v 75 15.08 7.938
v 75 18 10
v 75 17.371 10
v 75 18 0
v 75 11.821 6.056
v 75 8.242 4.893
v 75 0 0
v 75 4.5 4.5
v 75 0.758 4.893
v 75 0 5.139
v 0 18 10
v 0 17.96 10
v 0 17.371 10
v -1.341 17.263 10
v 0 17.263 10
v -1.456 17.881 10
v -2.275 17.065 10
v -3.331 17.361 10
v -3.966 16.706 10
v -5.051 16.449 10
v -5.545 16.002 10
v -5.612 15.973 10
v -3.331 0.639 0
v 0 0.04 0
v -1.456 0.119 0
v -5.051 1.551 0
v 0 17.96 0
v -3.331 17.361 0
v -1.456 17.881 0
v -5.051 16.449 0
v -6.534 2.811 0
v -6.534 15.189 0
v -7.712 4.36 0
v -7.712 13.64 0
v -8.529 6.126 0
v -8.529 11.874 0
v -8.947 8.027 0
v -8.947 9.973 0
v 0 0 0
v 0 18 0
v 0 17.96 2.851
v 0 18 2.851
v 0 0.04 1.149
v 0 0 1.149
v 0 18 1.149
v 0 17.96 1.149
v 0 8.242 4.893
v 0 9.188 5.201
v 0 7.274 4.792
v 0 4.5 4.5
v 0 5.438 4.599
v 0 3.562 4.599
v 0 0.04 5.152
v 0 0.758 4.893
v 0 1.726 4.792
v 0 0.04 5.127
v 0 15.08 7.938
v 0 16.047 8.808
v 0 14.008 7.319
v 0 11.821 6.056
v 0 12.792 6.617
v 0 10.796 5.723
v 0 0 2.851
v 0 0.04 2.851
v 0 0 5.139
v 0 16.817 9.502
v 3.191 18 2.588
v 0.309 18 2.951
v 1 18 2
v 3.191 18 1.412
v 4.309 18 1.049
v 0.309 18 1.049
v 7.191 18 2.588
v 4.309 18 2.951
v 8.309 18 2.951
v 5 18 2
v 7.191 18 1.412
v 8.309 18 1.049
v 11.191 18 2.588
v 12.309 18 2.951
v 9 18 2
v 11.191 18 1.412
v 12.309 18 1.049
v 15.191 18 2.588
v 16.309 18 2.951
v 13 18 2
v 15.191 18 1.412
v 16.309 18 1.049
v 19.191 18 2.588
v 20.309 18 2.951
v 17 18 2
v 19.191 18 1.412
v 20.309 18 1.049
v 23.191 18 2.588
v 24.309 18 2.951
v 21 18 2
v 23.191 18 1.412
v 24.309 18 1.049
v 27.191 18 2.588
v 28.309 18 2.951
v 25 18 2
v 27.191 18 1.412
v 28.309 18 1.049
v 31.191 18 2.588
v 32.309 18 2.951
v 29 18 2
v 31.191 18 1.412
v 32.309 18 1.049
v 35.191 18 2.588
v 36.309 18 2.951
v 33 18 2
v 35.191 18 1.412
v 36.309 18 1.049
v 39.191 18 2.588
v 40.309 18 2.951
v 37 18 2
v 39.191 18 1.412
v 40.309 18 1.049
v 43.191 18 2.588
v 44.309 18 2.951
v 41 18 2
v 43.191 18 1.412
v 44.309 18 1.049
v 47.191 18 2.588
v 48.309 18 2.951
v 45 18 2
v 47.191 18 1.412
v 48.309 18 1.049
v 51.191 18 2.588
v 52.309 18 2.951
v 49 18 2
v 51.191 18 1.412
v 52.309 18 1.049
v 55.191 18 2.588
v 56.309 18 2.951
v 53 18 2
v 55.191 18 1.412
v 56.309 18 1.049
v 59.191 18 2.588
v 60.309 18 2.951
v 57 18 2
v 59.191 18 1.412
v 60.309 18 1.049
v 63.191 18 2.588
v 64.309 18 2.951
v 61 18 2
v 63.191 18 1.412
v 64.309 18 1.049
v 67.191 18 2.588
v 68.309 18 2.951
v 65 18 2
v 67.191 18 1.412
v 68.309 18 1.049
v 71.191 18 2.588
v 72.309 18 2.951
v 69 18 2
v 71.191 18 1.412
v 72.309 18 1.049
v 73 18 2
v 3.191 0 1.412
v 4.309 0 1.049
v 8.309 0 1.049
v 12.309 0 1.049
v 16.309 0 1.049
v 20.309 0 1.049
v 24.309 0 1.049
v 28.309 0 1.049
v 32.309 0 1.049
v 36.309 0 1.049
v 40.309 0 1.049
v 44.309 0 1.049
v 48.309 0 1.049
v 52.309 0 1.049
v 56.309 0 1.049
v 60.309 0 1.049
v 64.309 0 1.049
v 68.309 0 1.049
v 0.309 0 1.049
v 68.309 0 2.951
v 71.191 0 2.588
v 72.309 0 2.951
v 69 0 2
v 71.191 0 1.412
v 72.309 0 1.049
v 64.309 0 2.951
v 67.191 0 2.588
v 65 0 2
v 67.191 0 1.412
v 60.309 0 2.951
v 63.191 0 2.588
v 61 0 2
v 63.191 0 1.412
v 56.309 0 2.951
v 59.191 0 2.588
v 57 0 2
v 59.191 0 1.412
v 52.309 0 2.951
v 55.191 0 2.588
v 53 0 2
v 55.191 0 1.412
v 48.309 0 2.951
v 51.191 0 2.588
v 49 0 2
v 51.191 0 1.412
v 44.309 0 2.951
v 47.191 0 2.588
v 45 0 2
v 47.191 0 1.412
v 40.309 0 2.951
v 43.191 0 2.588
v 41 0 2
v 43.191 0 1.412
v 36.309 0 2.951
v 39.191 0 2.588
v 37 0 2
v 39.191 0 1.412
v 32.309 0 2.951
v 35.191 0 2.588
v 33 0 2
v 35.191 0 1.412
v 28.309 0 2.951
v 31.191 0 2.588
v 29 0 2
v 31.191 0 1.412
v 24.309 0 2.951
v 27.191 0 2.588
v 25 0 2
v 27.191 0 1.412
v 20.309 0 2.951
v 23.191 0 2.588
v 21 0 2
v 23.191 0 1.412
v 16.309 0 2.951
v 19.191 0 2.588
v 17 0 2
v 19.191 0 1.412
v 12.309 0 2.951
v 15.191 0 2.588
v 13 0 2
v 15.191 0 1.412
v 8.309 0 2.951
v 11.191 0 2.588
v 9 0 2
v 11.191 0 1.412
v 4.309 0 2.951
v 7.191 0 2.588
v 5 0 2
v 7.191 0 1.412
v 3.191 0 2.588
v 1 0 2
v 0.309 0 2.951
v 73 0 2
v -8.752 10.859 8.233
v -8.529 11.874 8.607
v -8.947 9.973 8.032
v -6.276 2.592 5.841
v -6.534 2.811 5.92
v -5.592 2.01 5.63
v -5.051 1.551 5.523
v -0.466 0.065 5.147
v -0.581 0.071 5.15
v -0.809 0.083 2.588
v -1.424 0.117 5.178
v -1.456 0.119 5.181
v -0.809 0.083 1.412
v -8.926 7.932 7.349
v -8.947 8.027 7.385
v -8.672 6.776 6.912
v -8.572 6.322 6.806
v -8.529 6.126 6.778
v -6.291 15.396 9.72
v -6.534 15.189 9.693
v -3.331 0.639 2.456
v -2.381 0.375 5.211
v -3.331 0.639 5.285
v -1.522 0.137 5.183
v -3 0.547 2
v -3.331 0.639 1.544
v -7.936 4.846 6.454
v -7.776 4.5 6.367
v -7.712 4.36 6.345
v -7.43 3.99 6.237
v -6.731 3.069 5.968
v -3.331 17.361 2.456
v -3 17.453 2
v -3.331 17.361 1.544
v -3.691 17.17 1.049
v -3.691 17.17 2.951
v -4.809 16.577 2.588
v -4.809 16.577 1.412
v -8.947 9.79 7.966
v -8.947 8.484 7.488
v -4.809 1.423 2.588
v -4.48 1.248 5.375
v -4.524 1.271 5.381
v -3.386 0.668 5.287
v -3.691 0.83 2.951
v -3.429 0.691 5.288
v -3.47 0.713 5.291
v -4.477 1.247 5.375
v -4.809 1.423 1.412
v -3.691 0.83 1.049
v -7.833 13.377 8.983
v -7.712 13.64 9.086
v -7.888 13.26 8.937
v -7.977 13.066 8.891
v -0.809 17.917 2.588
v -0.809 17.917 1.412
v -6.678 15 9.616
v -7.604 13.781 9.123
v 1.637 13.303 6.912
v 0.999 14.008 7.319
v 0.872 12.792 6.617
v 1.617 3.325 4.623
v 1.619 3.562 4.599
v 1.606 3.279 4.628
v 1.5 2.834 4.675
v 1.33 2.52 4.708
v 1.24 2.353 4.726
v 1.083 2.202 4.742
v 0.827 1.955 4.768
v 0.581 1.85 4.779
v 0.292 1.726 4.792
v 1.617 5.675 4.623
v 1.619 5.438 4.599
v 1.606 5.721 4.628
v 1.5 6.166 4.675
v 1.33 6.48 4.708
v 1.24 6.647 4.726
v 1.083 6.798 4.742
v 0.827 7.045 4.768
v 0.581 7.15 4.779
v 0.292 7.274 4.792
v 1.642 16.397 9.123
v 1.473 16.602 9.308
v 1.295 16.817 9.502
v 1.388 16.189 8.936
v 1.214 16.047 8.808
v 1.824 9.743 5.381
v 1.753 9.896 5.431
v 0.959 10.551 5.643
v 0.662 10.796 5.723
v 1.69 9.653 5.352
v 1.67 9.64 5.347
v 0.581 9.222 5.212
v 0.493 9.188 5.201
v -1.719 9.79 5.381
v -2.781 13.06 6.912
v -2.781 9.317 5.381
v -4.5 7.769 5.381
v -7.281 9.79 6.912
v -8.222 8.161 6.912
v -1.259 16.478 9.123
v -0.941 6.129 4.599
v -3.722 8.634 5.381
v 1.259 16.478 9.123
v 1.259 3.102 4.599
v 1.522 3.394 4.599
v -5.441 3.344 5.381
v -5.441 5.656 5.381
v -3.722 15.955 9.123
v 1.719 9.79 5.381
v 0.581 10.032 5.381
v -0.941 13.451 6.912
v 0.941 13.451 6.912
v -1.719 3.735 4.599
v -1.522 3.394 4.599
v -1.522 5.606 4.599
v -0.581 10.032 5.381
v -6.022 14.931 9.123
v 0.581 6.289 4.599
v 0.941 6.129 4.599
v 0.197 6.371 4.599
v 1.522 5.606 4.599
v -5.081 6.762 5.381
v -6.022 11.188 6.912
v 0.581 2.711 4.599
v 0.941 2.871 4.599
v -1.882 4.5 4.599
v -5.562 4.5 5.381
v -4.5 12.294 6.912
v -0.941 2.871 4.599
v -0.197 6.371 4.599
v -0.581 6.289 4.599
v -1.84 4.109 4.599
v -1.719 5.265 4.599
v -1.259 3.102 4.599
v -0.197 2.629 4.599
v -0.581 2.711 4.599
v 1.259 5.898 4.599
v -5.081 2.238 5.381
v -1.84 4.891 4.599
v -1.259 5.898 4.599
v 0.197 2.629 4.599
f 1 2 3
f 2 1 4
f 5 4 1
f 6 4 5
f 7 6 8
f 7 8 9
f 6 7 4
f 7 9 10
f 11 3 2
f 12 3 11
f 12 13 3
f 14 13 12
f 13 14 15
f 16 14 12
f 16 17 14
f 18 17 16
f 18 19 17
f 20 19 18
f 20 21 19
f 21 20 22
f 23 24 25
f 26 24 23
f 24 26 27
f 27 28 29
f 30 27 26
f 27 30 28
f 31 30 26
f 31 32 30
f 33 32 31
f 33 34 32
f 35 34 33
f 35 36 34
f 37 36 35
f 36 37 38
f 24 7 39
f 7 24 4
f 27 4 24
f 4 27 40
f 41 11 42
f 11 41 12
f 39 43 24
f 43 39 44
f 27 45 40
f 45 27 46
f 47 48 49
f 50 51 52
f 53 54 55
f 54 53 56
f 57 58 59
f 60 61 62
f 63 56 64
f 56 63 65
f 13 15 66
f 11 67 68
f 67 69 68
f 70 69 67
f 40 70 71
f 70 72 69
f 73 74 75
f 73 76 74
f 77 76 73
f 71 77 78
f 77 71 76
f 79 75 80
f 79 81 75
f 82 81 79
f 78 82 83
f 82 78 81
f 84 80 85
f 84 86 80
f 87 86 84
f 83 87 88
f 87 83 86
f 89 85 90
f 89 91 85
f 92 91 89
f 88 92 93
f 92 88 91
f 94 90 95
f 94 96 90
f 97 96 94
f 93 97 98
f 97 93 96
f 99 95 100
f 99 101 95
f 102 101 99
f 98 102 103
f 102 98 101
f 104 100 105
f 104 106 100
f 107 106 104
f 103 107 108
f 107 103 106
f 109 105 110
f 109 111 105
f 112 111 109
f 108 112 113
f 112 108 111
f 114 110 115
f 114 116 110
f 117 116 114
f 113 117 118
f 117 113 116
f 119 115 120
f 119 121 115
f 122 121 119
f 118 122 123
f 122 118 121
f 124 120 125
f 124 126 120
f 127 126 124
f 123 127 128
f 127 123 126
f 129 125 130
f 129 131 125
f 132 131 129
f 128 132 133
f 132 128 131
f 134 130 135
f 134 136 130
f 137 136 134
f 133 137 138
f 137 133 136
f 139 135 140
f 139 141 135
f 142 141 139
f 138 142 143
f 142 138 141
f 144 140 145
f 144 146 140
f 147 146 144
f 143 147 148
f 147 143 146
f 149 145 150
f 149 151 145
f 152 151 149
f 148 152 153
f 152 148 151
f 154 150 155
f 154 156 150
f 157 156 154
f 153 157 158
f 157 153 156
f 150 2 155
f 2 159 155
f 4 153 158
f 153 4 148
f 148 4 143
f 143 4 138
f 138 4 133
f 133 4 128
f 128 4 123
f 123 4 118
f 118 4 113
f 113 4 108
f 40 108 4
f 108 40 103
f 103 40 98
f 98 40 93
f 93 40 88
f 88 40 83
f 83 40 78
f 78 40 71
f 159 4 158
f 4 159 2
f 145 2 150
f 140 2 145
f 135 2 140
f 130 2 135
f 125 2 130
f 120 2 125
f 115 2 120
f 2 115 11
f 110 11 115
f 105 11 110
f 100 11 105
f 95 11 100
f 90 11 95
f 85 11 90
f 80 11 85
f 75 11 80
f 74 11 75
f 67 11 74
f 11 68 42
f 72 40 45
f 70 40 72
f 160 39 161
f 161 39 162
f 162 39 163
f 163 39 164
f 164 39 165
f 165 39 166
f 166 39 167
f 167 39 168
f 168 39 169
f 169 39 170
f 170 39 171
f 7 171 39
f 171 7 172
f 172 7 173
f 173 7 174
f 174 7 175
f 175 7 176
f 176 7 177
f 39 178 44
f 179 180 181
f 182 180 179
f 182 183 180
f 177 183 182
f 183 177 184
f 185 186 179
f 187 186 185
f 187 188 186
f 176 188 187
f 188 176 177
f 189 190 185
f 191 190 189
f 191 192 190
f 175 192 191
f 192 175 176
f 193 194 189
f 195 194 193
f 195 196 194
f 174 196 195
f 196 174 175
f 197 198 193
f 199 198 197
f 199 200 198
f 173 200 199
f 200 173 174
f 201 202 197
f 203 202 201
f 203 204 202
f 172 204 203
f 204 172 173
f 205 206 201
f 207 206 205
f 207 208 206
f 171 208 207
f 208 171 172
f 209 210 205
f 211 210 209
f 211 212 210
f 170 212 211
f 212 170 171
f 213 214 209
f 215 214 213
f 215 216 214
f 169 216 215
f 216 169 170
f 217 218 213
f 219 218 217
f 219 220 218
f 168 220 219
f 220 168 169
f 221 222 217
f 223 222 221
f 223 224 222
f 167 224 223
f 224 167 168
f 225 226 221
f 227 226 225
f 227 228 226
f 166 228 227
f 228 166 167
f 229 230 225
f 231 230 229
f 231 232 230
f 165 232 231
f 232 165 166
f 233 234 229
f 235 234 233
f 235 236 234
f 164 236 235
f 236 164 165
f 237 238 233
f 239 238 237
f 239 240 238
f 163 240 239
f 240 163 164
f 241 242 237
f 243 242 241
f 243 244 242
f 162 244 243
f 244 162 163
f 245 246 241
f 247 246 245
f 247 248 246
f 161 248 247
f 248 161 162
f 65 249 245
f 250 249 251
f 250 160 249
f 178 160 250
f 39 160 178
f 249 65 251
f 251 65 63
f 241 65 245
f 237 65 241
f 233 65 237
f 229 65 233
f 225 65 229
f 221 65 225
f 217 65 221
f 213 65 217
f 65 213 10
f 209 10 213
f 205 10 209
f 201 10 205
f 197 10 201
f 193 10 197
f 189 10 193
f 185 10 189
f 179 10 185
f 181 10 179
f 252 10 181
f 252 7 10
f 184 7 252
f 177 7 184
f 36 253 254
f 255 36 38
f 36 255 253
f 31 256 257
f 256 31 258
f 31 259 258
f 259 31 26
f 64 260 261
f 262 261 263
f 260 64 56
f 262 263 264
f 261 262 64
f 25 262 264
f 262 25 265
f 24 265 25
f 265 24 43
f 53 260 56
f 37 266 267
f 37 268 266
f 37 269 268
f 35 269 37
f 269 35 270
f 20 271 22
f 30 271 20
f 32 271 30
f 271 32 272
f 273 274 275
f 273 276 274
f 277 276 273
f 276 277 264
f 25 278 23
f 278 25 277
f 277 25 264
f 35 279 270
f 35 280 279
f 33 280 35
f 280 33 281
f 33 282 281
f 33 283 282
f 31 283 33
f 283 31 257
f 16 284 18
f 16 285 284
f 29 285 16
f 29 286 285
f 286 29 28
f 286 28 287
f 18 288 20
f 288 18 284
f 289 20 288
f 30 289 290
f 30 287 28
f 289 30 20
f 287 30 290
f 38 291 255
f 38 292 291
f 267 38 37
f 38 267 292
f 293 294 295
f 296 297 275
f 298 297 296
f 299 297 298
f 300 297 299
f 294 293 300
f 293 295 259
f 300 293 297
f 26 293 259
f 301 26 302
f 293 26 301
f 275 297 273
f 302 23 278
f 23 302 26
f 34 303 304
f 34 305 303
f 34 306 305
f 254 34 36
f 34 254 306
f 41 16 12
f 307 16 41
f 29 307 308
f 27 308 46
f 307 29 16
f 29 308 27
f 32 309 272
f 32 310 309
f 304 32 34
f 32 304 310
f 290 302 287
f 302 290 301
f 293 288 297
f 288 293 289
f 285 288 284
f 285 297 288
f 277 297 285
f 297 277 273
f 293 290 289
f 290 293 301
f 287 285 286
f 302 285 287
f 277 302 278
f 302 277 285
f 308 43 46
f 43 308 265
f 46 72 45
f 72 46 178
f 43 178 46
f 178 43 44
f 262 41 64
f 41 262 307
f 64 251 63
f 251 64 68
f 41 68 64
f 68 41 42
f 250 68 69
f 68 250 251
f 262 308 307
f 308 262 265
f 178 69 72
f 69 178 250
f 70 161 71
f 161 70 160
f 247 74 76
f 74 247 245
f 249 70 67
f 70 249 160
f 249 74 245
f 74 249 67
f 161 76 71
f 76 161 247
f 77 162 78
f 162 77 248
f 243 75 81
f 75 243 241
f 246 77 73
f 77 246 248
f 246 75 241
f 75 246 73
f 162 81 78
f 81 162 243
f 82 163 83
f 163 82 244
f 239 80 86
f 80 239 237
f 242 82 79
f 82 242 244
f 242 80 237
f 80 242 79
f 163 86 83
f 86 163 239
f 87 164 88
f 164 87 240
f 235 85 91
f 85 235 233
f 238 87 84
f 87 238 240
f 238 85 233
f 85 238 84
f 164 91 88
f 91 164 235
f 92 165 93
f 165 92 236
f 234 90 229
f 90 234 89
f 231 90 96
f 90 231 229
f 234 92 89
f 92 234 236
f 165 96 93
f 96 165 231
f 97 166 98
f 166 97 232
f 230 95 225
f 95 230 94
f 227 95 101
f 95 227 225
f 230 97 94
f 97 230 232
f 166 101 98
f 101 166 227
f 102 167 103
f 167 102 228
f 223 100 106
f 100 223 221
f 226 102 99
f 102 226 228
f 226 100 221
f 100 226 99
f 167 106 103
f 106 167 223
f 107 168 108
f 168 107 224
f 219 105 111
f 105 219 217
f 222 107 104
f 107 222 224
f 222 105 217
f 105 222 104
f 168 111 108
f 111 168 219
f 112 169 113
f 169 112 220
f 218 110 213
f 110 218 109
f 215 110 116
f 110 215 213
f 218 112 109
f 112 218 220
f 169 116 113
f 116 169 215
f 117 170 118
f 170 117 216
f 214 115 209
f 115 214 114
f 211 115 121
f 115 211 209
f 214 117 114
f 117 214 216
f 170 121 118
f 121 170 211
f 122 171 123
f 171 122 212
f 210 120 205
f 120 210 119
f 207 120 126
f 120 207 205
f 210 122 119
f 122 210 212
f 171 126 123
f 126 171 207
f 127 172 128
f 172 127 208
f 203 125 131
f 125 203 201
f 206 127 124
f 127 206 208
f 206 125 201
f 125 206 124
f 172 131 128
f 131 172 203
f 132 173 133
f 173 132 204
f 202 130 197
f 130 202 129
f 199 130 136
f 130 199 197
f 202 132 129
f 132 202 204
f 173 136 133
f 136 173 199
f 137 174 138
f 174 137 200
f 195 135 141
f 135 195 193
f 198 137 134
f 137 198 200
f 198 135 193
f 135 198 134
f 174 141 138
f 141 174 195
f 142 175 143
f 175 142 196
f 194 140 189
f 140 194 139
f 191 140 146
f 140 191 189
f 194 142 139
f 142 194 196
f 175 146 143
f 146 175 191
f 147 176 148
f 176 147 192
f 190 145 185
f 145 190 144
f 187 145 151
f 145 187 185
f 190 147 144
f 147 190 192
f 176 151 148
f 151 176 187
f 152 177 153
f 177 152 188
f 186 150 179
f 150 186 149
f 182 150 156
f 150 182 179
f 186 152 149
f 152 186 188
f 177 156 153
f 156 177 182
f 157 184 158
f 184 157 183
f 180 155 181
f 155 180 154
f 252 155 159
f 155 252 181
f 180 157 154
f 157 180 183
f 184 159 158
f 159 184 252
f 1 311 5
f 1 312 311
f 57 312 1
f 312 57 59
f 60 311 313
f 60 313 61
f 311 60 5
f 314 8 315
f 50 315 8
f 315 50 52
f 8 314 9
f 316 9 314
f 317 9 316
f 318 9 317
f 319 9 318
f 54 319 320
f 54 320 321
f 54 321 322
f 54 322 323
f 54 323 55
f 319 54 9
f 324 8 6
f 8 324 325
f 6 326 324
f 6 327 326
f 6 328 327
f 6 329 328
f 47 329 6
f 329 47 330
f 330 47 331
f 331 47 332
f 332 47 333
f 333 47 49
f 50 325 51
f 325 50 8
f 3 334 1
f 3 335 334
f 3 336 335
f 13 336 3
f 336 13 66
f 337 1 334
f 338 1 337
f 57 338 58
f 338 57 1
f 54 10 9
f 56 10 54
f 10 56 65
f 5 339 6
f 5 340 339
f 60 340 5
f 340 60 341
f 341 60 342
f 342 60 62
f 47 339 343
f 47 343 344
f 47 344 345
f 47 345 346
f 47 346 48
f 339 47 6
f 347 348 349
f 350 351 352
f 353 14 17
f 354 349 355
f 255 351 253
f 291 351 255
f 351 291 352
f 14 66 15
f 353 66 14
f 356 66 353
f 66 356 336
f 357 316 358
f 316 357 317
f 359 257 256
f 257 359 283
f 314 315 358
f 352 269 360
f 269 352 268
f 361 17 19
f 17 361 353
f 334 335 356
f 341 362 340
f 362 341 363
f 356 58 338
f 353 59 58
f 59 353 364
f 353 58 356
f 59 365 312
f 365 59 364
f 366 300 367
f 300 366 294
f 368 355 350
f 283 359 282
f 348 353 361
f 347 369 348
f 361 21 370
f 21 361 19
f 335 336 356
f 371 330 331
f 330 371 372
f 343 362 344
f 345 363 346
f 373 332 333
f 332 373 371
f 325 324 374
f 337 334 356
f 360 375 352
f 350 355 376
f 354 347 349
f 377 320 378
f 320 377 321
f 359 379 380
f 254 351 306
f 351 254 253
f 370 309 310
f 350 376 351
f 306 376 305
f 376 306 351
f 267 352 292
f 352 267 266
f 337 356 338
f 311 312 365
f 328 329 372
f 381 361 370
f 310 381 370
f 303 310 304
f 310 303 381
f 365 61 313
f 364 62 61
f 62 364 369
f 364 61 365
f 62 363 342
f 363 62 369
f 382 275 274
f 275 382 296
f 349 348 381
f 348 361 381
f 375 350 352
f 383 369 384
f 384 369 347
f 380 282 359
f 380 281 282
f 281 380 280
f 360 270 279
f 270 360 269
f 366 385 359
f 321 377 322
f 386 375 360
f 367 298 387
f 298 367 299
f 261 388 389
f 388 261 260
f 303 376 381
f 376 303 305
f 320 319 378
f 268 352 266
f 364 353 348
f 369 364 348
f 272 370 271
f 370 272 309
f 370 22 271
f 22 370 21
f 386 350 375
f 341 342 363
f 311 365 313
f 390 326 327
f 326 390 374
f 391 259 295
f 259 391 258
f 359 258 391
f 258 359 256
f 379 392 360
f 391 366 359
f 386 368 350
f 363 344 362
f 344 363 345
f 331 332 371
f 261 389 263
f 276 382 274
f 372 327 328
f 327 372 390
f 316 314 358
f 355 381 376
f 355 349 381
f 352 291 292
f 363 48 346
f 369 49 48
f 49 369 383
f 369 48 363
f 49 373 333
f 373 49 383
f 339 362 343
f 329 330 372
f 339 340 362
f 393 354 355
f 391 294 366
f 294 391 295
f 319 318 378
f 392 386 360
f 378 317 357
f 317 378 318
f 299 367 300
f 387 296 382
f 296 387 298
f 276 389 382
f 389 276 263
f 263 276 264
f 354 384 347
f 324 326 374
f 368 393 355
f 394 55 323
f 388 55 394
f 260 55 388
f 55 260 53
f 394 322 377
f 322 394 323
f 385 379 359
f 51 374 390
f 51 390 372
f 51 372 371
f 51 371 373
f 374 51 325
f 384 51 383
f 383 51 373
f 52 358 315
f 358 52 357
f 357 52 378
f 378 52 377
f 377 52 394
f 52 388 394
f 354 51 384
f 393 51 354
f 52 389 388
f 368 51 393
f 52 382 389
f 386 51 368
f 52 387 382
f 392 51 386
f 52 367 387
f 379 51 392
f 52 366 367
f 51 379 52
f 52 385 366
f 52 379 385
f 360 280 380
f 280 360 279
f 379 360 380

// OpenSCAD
Depth = 84;
Width = 18;
Thickness = 10;


difference()
{
 union()
{
cube([Depth - (Width/2),Width,Thickness]);
translate([0, Width/2, 0]) cylinder(r=Width/2, h=Thickness);
}

translate([0, Width/4, Width + (Width/4)]) rotate([0, 90, 0]) cylinder(r=Width, h=Depth);
translate([0, Width/4, Width + (Width/4)]) sphere(r=Width);


	for (i = [1:(Depth)/4]) {
		translate([i * ( 4 ) - (.5 * Width) +1, Width +1 , 2 ])
			rotate([90, 0, 0])
				cylinder(h=Width + Thickness, r=(1) );
	}

}
